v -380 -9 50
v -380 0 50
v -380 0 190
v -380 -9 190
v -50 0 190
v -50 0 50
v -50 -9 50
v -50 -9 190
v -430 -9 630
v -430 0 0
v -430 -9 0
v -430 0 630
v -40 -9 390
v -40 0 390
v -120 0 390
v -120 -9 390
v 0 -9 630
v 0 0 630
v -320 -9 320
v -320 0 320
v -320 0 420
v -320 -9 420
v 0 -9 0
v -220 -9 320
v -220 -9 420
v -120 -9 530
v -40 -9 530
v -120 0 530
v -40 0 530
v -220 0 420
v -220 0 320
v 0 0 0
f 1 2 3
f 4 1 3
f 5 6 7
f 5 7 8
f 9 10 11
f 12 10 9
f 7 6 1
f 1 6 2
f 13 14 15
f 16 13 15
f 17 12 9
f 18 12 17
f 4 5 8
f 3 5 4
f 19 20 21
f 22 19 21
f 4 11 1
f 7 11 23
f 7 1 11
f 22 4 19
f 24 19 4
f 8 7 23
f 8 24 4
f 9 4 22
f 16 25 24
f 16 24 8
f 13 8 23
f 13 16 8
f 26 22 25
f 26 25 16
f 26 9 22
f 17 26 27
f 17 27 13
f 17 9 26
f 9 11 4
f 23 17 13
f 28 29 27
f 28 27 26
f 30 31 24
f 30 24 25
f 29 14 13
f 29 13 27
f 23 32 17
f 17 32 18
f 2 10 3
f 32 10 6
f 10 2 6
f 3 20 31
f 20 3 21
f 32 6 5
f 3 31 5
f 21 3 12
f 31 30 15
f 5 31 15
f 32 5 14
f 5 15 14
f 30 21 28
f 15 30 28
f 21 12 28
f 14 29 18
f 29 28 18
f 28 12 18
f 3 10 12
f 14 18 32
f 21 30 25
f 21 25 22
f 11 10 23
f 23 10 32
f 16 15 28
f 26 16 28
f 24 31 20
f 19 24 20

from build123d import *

# Parameters (mm, degrees)
F0_W     = 430
F0_H     = 630
F1_DEPTH = 9
F2_W     = 330
F2_H     = 140
F2_W_2   = 100
F2_H_2   = 100
F2_W_3   = 80
F3_DEPTH = 25


with BuildPart() as f1:
    # F0 (on Front) → F1 (new body)
    with BuildSketch(Plane.XZ):
        with Locations((-215, 315)):
            Rectangle(F0_W, F0_H)
    extrude(amount=F1_DEPTH)

    # F2 (on face) → F3 (cut)
    with BuildSketch(Plane(origin=(0, 0, 0), x_dir=(-1, 0, 0), z_dir=(0, 1, 0))):
        with Locations((215, 120)):
            Rectangle(F2_W, F2_H)
        with Locations((270, 370)):
            Rectangle(F2_W_2, F2_H_2)
        with Locations((80, 460)):
            Rectangle(F2_W_3, F2_H)
    extrude(amount=-F3_DEPTH, mode=Mode.SUBTRACT)


solid = f1.part
